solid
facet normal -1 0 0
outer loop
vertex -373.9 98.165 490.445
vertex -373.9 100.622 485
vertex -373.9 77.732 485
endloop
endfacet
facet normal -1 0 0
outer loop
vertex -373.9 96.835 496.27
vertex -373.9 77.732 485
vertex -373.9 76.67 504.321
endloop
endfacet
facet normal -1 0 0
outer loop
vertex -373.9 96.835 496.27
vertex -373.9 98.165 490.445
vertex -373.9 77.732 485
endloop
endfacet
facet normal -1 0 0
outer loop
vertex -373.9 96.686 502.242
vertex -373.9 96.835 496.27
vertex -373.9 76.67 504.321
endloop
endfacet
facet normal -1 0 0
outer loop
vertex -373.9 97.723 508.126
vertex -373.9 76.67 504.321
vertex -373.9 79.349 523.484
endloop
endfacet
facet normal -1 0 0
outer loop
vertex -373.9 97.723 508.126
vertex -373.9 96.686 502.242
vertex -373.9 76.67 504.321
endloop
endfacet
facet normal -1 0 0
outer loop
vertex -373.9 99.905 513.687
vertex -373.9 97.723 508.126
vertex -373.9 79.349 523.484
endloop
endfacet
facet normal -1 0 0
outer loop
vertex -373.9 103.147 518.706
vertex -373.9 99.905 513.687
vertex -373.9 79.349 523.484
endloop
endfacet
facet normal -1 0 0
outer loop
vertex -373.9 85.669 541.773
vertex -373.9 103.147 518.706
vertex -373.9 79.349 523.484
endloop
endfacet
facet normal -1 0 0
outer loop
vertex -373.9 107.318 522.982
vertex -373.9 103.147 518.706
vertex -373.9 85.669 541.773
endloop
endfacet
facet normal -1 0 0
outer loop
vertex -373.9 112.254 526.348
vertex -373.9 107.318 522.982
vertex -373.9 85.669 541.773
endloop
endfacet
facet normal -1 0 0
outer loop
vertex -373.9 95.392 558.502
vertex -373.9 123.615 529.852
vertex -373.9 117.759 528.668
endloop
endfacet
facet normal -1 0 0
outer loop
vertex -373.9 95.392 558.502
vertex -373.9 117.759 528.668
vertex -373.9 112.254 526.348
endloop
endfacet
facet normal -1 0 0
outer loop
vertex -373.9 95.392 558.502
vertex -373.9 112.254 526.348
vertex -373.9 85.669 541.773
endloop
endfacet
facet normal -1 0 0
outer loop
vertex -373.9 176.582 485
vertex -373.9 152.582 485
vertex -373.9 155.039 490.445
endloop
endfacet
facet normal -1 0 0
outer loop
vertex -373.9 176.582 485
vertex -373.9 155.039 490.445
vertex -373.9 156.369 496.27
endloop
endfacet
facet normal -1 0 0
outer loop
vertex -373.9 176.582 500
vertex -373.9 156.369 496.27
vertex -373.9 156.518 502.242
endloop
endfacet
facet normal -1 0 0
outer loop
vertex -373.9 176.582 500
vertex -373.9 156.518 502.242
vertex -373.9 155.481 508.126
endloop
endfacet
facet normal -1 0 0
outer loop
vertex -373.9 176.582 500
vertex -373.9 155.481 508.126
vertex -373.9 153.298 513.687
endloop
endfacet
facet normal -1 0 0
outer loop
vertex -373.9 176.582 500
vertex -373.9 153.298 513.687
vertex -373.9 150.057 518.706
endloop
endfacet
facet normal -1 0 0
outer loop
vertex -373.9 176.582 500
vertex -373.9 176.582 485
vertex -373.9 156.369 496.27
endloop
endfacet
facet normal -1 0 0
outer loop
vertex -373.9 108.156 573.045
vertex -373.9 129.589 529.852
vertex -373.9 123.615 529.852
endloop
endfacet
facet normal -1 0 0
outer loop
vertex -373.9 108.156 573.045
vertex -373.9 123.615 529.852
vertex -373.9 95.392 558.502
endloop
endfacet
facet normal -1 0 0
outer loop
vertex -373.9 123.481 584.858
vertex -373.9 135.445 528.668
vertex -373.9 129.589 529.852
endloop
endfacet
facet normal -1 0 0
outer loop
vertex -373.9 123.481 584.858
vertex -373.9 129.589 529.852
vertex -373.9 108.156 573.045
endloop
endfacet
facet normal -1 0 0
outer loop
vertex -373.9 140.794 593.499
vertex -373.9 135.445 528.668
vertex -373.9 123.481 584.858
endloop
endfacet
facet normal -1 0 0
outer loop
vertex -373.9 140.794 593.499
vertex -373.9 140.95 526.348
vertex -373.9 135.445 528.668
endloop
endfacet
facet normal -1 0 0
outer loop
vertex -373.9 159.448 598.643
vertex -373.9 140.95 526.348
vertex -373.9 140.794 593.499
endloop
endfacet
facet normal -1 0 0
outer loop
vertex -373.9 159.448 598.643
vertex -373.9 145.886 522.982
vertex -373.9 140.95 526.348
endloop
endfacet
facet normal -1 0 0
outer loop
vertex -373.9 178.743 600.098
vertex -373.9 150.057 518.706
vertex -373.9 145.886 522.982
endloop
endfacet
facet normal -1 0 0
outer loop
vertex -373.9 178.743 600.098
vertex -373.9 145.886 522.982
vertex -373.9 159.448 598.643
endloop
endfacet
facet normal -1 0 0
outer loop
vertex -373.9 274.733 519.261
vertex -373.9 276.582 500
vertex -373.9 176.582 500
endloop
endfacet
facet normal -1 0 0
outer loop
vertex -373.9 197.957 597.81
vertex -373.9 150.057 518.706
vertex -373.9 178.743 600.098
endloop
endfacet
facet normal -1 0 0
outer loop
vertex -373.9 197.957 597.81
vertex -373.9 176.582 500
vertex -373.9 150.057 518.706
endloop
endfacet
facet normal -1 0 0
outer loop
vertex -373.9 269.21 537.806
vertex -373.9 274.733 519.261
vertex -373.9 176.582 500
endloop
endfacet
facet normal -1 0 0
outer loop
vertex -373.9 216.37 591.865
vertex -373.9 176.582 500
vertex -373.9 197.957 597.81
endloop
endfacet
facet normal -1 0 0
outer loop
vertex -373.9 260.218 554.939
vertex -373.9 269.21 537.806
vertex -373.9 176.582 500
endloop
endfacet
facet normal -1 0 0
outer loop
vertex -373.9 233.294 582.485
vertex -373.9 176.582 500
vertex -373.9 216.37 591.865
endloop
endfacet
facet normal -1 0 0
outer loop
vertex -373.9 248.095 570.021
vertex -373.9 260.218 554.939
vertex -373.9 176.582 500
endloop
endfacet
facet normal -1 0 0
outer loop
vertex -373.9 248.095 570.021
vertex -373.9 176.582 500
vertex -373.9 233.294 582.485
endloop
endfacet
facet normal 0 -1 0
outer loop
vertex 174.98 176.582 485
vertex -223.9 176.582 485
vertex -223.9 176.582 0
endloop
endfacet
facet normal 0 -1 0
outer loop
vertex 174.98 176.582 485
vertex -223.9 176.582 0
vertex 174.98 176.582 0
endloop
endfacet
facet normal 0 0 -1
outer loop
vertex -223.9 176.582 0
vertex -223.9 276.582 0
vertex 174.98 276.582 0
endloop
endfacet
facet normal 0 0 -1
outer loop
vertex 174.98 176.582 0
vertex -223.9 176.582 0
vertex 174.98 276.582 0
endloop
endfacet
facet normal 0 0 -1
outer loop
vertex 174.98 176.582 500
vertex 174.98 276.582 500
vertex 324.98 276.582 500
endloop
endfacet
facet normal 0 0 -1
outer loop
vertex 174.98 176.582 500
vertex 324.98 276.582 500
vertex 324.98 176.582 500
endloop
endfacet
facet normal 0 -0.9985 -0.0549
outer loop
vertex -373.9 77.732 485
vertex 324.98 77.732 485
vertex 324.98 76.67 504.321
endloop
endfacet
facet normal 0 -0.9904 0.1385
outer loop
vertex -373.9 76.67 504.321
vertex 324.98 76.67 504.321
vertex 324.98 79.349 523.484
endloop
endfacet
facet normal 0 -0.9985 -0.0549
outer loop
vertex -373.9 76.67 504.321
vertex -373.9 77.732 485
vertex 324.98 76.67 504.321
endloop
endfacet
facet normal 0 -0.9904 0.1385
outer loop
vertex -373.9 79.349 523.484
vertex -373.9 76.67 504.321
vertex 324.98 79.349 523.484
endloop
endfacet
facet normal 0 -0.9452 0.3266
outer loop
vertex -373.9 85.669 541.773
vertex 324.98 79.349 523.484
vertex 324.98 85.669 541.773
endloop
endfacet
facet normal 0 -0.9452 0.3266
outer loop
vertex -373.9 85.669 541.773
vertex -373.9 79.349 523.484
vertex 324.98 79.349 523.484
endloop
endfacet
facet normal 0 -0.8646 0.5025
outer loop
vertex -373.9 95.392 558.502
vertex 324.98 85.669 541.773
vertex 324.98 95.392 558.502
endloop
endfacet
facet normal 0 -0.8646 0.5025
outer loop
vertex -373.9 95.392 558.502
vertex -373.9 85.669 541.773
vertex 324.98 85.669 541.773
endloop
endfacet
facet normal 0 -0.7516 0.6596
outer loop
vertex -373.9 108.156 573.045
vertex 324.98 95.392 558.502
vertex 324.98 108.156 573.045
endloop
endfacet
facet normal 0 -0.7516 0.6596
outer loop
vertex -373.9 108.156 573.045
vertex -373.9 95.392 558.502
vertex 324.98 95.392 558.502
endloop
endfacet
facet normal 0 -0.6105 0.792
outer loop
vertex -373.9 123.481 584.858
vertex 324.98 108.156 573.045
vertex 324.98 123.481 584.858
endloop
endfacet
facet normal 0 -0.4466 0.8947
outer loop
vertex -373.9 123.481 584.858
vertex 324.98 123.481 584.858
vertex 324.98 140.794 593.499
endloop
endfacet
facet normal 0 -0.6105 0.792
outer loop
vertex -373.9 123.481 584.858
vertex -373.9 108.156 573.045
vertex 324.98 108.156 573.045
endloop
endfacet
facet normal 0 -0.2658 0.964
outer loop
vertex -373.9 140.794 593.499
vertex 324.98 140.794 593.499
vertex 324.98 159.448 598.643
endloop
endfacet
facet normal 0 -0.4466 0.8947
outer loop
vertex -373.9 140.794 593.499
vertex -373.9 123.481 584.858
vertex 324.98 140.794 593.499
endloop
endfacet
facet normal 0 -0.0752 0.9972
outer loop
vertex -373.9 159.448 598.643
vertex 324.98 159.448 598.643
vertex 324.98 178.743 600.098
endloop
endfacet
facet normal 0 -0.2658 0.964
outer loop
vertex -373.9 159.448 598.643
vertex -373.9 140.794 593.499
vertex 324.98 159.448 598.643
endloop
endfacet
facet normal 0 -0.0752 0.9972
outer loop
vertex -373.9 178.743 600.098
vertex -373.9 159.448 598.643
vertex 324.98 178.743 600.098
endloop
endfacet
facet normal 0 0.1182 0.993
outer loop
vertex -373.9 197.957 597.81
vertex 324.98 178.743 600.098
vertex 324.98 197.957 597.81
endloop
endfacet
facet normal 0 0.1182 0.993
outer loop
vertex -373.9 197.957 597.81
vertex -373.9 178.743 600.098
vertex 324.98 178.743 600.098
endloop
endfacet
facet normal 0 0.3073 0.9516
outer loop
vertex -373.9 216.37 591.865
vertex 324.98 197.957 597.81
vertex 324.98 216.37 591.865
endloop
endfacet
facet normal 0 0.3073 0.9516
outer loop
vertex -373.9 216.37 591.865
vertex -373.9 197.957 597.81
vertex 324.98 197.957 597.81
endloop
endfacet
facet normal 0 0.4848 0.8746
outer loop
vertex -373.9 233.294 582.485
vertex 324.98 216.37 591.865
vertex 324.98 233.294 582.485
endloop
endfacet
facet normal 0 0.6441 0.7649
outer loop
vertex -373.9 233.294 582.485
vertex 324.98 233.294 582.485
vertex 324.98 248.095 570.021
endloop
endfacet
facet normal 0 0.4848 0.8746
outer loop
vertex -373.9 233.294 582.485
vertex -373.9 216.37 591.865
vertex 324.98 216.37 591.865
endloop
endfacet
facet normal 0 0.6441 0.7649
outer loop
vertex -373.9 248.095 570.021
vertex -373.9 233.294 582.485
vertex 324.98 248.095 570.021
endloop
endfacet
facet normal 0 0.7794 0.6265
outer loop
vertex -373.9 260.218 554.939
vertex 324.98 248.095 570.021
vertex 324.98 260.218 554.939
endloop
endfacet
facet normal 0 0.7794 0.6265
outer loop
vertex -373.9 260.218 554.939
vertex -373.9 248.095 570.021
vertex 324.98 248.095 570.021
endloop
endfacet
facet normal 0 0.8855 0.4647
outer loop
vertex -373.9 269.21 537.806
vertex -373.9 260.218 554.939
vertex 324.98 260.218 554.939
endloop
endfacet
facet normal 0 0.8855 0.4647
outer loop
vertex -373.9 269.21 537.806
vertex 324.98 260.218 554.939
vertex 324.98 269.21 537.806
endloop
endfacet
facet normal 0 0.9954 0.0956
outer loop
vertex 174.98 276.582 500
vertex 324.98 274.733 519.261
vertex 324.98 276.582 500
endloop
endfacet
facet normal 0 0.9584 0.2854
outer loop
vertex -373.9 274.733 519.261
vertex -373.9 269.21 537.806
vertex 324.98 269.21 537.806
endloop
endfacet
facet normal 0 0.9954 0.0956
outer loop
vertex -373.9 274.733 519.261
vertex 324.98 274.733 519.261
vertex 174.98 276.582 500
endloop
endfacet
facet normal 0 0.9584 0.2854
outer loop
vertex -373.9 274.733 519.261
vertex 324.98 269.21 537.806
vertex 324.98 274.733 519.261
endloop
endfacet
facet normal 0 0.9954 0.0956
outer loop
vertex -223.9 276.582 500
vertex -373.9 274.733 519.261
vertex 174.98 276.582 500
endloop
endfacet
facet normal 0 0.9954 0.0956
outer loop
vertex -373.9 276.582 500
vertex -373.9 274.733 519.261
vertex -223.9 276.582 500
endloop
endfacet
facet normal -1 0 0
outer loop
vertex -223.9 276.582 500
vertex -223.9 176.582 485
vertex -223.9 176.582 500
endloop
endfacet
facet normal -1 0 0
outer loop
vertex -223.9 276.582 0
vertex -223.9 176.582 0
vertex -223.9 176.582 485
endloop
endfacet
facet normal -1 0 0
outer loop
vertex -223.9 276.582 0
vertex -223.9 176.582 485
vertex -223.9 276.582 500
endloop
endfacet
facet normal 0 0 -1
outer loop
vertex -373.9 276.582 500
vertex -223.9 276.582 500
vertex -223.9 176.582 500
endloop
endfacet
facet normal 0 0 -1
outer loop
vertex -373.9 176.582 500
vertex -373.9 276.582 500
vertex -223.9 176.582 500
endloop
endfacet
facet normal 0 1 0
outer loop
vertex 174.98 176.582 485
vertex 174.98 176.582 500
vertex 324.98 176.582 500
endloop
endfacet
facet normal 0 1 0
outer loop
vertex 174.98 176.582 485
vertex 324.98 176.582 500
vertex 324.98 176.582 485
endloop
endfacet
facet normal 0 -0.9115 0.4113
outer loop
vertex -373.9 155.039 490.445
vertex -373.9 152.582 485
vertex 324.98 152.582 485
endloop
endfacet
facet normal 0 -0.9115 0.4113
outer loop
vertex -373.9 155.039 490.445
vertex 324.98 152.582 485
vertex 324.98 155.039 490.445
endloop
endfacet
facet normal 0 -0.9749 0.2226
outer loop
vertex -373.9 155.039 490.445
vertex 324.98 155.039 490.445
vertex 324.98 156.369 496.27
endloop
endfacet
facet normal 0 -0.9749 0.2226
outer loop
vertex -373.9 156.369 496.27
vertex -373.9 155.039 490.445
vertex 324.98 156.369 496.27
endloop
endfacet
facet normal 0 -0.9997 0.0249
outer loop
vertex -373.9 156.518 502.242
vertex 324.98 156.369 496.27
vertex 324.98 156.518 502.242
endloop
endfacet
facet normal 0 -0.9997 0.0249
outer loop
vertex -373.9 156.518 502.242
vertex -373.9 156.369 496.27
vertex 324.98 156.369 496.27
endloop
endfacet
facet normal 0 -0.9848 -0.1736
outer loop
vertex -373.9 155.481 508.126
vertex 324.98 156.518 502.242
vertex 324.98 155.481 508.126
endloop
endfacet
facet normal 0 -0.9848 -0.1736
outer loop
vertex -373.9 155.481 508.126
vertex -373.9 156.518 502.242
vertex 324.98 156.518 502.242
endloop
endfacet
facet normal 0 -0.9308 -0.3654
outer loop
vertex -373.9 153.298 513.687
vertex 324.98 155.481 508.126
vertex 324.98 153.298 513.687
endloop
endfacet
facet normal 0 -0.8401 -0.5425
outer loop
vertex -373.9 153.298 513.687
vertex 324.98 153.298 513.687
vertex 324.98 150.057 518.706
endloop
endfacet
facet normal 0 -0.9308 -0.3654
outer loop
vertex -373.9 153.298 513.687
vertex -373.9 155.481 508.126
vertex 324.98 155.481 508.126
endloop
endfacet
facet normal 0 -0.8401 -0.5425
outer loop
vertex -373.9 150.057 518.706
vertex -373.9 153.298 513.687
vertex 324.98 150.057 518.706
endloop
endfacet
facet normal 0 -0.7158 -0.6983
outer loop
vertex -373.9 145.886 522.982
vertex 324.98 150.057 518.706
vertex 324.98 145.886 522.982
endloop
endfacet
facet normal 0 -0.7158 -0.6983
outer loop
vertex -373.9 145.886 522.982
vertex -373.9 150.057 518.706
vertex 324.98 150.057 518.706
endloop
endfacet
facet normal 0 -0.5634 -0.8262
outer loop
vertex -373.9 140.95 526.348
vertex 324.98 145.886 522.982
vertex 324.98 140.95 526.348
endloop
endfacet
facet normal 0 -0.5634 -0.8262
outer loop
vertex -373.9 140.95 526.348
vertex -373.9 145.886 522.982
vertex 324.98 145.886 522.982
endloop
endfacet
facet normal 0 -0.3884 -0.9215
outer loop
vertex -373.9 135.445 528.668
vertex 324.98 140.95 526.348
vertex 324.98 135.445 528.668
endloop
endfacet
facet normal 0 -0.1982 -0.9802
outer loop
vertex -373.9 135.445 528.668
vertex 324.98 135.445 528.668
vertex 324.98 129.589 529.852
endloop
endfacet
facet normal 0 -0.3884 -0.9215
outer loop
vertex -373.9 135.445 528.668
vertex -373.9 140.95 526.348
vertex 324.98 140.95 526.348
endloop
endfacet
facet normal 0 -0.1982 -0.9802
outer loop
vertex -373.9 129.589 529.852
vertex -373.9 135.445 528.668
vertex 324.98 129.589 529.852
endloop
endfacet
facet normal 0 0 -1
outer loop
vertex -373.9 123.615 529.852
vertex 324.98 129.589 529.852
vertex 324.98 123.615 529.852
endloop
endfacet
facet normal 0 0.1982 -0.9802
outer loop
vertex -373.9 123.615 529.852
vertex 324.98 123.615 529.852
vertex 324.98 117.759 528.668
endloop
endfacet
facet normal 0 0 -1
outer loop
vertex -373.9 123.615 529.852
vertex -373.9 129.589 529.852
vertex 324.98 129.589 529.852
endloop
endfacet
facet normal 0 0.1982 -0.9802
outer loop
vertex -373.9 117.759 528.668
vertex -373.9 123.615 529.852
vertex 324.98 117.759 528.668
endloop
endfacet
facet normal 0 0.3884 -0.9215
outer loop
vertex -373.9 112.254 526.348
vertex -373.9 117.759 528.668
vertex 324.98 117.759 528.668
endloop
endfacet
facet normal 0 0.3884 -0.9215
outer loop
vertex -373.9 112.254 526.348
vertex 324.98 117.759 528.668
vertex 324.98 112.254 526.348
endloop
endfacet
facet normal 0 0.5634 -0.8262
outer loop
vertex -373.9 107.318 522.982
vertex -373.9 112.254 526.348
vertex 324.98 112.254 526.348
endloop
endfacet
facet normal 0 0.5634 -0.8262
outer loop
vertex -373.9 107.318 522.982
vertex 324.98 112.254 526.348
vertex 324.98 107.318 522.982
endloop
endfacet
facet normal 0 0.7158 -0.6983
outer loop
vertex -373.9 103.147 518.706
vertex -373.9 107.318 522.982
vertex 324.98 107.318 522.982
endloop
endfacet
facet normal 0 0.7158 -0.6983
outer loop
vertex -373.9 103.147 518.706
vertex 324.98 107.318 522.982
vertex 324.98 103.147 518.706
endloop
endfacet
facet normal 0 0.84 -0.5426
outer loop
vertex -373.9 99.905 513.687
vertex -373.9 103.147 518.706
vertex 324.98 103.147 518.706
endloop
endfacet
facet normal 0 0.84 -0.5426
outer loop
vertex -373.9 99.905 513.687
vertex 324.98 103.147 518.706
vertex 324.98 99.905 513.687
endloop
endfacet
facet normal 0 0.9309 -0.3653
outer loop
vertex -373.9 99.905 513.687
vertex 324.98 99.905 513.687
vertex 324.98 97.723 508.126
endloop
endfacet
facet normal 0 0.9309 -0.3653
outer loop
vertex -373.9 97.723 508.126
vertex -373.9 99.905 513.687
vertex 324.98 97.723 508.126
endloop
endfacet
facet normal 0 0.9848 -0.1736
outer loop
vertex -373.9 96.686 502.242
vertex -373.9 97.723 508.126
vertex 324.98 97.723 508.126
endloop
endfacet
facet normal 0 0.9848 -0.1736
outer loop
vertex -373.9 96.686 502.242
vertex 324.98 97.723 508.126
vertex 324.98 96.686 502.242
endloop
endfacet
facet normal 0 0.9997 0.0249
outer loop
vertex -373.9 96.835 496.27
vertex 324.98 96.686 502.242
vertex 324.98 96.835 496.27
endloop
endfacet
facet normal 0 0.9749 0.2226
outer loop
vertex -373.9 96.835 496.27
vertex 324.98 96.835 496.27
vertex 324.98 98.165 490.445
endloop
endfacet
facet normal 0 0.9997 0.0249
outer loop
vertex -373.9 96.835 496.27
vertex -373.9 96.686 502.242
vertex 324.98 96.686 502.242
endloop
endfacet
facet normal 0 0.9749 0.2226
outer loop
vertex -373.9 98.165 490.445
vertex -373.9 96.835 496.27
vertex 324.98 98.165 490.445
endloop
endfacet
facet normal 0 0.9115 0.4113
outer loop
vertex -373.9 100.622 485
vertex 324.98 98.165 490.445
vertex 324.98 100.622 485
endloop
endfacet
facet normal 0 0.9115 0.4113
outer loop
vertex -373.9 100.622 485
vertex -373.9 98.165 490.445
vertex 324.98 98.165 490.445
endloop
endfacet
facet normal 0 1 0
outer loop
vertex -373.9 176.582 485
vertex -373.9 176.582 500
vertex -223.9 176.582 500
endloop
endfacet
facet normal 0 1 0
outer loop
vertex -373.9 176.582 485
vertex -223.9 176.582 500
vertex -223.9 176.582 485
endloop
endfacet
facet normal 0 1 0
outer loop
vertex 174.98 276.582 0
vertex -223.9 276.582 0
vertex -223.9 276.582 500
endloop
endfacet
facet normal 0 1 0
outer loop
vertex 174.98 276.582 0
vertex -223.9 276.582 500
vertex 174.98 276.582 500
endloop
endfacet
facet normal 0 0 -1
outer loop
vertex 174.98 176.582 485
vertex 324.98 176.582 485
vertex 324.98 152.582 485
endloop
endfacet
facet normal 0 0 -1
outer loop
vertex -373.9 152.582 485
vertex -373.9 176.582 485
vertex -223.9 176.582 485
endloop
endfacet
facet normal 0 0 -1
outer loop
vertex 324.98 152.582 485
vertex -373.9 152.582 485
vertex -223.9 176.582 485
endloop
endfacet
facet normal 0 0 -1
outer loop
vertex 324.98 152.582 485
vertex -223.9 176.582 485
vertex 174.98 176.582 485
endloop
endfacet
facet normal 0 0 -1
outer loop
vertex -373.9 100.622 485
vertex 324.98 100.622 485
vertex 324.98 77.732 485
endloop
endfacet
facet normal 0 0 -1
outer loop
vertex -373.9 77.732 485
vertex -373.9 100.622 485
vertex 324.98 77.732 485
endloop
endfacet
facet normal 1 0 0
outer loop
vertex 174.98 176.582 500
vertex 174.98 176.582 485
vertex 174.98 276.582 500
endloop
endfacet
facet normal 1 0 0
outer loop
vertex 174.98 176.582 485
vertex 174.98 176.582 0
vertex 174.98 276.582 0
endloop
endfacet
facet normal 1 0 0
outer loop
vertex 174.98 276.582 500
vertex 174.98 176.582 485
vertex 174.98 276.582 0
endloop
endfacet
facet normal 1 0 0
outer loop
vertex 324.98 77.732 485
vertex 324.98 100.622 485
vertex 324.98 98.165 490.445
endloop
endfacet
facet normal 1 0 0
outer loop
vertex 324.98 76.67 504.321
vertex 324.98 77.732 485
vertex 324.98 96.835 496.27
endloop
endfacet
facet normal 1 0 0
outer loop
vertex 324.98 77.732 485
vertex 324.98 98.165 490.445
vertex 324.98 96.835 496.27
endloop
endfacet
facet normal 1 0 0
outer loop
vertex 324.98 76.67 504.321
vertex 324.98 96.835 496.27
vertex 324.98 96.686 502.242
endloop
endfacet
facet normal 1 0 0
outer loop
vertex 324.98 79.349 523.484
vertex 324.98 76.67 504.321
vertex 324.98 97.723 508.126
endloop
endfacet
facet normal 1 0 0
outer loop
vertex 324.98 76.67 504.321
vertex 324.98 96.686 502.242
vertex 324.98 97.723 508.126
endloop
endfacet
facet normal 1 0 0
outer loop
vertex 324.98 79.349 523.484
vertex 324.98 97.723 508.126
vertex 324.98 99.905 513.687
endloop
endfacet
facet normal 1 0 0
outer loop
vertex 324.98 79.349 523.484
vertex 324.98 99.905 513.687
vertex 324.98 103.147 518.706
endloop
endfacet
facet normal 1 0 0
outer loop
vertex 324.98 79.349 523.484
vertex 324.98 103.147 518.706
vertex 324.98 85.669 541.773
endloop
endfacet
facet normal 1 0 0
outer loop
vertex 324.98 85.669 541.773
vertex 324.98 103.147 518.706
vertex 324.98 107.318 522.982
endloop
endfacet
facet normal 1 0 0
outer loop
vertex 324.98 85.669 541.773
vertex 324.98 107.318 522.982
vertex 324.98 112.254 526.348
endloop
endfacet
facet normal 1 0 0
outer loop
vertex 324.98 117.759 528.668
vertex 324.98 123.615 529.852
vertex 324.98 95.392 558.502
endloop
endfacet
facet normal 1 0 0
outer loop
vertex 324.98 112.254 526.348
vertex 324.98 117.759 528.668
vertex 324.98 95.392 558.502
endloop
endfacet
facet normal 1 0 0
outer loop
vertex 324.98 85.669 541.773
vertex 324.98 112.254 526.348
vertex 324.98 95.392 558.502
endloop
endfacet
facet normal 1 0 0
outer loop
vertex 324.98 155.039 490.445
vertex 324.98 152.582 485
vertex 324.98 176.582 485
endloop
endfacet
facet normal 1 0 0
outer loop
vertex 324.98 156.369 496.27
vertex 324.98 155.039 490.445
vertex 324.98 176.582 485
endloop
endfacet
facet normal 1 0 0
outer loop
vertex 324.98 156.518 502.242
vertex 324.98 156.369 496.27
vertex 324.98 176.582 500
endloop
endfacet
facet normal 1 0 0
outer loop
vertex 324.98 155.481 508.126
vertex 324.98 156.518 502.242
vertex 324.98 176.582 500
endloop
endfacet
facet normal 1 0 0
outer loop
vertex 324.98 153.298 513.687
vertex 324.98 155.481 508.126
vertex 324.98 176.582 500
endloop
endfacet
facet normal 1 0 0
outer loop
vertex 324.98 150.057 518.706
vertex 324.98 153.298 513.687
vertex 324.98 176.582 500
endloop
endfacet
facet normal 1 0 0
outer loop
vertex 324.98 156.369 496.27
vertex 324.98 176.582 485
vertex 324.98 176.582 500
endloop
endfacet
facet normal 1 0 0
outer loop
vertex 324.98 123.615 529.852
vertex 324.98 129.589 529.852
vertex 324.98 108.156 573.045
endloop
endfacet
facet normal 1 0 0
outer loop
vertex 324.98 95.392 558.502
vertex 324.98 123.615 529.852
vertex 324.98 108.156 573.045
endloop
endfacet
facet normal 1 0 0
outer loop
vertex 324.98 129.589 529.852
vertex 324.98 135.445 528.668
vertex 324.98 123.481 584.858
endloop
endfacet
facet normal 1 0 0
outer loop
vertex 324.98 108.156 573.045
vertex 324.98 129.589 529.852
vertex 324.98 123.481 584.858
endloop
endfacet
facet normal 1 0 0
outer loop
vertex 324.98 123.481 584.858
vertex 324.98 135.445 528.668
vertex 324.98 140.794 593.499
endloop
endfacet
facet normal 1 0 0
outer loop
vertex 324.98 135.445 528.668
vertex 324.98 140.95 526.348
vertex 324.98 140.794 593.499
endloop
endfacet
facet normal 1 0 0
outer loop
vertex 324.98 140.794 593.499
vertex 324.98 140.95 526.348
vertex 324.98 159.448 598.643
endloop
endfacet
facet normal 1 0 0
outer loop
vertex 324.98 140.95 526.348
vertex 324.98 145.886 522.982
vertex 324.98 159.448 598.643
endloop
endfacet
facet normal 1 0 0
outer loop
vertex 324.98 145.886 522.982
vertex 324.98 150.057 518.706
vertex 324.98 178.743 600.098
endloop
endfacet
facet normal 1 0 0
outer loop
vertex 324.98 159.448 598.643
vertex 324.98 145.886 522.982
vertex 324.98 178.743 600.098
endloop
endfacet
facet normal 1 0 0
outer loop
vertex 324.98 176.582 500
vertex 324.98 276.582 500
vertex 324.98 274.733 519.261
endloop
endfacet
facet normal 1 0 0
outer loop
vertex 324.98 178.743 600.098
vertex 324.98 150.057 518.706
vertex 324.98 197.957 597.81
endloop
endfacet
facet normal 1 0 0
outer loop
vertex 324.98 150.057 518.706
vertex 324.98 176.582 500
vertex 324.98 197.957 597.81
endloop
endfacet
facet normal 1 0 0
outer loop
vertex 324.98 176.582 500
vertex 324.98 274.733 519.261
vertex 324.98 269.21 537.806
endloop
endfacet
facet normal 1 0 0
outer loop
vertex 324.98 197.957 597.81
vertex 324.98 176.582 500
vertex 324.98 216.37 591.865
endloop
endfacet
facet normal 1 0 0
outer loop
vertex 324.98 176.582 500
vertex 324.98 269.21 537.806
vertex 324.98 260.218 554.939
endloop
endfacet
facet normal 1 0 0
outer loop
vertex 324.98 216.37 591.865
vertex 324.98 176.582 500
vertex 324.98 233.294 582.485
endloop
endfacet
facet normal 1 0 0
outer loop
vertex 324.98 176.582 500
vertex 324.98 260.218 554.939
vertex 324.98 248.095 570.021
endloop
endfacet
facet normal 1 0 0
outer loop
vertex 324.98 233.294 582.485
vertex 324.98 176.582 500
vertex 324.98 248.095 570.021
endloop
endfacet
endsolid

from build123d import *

# Parameters (mm, degrees)
SKETCH1_W           = 398.88
SKETCH1_H           = 100
BOSS_EXTRUDE1_DEPTH = 500
BOSS_EXTRUDE2_DEPTH = 698.88


with BuildPart() as part:
    # Sketch1 → Boss-Extrude1 (new body)
    with BuildSketch(Plane.XY):
        with Locations((-24.459622642, 226.581886792)):
            Rectangle(SKETCH1_W, SKETCH1_H)
    extrude(amount=BOSS_EXTRUDE1_DEPTH)

    # Sketch2 → Boss-Extrude2 (add)
    with BuildSketch(Plane.ZY.offset(373.899622642)):
        with BuildLine():
            Line((500, 276.581886792), (500, 176.581886792))
            Line((500, 176.581886792), (485, 176.581886792))
            Line((485, 176.581886792), (485, 152.581886792))
            ThreePointArc((485, 152.581886792), (530.001319942, 126.601886792), (485, 100.621886792))
            Line((485, 100.621886792), (485, 77.731886792))
            ThreePointArc((485, 77.731886792), (599.838299174, 169.059957008), (500, 276.581886792))
        make_face()
    extrude(amount=-BOSS_EXTRUDE2_DEPTH)


solid = part.part
